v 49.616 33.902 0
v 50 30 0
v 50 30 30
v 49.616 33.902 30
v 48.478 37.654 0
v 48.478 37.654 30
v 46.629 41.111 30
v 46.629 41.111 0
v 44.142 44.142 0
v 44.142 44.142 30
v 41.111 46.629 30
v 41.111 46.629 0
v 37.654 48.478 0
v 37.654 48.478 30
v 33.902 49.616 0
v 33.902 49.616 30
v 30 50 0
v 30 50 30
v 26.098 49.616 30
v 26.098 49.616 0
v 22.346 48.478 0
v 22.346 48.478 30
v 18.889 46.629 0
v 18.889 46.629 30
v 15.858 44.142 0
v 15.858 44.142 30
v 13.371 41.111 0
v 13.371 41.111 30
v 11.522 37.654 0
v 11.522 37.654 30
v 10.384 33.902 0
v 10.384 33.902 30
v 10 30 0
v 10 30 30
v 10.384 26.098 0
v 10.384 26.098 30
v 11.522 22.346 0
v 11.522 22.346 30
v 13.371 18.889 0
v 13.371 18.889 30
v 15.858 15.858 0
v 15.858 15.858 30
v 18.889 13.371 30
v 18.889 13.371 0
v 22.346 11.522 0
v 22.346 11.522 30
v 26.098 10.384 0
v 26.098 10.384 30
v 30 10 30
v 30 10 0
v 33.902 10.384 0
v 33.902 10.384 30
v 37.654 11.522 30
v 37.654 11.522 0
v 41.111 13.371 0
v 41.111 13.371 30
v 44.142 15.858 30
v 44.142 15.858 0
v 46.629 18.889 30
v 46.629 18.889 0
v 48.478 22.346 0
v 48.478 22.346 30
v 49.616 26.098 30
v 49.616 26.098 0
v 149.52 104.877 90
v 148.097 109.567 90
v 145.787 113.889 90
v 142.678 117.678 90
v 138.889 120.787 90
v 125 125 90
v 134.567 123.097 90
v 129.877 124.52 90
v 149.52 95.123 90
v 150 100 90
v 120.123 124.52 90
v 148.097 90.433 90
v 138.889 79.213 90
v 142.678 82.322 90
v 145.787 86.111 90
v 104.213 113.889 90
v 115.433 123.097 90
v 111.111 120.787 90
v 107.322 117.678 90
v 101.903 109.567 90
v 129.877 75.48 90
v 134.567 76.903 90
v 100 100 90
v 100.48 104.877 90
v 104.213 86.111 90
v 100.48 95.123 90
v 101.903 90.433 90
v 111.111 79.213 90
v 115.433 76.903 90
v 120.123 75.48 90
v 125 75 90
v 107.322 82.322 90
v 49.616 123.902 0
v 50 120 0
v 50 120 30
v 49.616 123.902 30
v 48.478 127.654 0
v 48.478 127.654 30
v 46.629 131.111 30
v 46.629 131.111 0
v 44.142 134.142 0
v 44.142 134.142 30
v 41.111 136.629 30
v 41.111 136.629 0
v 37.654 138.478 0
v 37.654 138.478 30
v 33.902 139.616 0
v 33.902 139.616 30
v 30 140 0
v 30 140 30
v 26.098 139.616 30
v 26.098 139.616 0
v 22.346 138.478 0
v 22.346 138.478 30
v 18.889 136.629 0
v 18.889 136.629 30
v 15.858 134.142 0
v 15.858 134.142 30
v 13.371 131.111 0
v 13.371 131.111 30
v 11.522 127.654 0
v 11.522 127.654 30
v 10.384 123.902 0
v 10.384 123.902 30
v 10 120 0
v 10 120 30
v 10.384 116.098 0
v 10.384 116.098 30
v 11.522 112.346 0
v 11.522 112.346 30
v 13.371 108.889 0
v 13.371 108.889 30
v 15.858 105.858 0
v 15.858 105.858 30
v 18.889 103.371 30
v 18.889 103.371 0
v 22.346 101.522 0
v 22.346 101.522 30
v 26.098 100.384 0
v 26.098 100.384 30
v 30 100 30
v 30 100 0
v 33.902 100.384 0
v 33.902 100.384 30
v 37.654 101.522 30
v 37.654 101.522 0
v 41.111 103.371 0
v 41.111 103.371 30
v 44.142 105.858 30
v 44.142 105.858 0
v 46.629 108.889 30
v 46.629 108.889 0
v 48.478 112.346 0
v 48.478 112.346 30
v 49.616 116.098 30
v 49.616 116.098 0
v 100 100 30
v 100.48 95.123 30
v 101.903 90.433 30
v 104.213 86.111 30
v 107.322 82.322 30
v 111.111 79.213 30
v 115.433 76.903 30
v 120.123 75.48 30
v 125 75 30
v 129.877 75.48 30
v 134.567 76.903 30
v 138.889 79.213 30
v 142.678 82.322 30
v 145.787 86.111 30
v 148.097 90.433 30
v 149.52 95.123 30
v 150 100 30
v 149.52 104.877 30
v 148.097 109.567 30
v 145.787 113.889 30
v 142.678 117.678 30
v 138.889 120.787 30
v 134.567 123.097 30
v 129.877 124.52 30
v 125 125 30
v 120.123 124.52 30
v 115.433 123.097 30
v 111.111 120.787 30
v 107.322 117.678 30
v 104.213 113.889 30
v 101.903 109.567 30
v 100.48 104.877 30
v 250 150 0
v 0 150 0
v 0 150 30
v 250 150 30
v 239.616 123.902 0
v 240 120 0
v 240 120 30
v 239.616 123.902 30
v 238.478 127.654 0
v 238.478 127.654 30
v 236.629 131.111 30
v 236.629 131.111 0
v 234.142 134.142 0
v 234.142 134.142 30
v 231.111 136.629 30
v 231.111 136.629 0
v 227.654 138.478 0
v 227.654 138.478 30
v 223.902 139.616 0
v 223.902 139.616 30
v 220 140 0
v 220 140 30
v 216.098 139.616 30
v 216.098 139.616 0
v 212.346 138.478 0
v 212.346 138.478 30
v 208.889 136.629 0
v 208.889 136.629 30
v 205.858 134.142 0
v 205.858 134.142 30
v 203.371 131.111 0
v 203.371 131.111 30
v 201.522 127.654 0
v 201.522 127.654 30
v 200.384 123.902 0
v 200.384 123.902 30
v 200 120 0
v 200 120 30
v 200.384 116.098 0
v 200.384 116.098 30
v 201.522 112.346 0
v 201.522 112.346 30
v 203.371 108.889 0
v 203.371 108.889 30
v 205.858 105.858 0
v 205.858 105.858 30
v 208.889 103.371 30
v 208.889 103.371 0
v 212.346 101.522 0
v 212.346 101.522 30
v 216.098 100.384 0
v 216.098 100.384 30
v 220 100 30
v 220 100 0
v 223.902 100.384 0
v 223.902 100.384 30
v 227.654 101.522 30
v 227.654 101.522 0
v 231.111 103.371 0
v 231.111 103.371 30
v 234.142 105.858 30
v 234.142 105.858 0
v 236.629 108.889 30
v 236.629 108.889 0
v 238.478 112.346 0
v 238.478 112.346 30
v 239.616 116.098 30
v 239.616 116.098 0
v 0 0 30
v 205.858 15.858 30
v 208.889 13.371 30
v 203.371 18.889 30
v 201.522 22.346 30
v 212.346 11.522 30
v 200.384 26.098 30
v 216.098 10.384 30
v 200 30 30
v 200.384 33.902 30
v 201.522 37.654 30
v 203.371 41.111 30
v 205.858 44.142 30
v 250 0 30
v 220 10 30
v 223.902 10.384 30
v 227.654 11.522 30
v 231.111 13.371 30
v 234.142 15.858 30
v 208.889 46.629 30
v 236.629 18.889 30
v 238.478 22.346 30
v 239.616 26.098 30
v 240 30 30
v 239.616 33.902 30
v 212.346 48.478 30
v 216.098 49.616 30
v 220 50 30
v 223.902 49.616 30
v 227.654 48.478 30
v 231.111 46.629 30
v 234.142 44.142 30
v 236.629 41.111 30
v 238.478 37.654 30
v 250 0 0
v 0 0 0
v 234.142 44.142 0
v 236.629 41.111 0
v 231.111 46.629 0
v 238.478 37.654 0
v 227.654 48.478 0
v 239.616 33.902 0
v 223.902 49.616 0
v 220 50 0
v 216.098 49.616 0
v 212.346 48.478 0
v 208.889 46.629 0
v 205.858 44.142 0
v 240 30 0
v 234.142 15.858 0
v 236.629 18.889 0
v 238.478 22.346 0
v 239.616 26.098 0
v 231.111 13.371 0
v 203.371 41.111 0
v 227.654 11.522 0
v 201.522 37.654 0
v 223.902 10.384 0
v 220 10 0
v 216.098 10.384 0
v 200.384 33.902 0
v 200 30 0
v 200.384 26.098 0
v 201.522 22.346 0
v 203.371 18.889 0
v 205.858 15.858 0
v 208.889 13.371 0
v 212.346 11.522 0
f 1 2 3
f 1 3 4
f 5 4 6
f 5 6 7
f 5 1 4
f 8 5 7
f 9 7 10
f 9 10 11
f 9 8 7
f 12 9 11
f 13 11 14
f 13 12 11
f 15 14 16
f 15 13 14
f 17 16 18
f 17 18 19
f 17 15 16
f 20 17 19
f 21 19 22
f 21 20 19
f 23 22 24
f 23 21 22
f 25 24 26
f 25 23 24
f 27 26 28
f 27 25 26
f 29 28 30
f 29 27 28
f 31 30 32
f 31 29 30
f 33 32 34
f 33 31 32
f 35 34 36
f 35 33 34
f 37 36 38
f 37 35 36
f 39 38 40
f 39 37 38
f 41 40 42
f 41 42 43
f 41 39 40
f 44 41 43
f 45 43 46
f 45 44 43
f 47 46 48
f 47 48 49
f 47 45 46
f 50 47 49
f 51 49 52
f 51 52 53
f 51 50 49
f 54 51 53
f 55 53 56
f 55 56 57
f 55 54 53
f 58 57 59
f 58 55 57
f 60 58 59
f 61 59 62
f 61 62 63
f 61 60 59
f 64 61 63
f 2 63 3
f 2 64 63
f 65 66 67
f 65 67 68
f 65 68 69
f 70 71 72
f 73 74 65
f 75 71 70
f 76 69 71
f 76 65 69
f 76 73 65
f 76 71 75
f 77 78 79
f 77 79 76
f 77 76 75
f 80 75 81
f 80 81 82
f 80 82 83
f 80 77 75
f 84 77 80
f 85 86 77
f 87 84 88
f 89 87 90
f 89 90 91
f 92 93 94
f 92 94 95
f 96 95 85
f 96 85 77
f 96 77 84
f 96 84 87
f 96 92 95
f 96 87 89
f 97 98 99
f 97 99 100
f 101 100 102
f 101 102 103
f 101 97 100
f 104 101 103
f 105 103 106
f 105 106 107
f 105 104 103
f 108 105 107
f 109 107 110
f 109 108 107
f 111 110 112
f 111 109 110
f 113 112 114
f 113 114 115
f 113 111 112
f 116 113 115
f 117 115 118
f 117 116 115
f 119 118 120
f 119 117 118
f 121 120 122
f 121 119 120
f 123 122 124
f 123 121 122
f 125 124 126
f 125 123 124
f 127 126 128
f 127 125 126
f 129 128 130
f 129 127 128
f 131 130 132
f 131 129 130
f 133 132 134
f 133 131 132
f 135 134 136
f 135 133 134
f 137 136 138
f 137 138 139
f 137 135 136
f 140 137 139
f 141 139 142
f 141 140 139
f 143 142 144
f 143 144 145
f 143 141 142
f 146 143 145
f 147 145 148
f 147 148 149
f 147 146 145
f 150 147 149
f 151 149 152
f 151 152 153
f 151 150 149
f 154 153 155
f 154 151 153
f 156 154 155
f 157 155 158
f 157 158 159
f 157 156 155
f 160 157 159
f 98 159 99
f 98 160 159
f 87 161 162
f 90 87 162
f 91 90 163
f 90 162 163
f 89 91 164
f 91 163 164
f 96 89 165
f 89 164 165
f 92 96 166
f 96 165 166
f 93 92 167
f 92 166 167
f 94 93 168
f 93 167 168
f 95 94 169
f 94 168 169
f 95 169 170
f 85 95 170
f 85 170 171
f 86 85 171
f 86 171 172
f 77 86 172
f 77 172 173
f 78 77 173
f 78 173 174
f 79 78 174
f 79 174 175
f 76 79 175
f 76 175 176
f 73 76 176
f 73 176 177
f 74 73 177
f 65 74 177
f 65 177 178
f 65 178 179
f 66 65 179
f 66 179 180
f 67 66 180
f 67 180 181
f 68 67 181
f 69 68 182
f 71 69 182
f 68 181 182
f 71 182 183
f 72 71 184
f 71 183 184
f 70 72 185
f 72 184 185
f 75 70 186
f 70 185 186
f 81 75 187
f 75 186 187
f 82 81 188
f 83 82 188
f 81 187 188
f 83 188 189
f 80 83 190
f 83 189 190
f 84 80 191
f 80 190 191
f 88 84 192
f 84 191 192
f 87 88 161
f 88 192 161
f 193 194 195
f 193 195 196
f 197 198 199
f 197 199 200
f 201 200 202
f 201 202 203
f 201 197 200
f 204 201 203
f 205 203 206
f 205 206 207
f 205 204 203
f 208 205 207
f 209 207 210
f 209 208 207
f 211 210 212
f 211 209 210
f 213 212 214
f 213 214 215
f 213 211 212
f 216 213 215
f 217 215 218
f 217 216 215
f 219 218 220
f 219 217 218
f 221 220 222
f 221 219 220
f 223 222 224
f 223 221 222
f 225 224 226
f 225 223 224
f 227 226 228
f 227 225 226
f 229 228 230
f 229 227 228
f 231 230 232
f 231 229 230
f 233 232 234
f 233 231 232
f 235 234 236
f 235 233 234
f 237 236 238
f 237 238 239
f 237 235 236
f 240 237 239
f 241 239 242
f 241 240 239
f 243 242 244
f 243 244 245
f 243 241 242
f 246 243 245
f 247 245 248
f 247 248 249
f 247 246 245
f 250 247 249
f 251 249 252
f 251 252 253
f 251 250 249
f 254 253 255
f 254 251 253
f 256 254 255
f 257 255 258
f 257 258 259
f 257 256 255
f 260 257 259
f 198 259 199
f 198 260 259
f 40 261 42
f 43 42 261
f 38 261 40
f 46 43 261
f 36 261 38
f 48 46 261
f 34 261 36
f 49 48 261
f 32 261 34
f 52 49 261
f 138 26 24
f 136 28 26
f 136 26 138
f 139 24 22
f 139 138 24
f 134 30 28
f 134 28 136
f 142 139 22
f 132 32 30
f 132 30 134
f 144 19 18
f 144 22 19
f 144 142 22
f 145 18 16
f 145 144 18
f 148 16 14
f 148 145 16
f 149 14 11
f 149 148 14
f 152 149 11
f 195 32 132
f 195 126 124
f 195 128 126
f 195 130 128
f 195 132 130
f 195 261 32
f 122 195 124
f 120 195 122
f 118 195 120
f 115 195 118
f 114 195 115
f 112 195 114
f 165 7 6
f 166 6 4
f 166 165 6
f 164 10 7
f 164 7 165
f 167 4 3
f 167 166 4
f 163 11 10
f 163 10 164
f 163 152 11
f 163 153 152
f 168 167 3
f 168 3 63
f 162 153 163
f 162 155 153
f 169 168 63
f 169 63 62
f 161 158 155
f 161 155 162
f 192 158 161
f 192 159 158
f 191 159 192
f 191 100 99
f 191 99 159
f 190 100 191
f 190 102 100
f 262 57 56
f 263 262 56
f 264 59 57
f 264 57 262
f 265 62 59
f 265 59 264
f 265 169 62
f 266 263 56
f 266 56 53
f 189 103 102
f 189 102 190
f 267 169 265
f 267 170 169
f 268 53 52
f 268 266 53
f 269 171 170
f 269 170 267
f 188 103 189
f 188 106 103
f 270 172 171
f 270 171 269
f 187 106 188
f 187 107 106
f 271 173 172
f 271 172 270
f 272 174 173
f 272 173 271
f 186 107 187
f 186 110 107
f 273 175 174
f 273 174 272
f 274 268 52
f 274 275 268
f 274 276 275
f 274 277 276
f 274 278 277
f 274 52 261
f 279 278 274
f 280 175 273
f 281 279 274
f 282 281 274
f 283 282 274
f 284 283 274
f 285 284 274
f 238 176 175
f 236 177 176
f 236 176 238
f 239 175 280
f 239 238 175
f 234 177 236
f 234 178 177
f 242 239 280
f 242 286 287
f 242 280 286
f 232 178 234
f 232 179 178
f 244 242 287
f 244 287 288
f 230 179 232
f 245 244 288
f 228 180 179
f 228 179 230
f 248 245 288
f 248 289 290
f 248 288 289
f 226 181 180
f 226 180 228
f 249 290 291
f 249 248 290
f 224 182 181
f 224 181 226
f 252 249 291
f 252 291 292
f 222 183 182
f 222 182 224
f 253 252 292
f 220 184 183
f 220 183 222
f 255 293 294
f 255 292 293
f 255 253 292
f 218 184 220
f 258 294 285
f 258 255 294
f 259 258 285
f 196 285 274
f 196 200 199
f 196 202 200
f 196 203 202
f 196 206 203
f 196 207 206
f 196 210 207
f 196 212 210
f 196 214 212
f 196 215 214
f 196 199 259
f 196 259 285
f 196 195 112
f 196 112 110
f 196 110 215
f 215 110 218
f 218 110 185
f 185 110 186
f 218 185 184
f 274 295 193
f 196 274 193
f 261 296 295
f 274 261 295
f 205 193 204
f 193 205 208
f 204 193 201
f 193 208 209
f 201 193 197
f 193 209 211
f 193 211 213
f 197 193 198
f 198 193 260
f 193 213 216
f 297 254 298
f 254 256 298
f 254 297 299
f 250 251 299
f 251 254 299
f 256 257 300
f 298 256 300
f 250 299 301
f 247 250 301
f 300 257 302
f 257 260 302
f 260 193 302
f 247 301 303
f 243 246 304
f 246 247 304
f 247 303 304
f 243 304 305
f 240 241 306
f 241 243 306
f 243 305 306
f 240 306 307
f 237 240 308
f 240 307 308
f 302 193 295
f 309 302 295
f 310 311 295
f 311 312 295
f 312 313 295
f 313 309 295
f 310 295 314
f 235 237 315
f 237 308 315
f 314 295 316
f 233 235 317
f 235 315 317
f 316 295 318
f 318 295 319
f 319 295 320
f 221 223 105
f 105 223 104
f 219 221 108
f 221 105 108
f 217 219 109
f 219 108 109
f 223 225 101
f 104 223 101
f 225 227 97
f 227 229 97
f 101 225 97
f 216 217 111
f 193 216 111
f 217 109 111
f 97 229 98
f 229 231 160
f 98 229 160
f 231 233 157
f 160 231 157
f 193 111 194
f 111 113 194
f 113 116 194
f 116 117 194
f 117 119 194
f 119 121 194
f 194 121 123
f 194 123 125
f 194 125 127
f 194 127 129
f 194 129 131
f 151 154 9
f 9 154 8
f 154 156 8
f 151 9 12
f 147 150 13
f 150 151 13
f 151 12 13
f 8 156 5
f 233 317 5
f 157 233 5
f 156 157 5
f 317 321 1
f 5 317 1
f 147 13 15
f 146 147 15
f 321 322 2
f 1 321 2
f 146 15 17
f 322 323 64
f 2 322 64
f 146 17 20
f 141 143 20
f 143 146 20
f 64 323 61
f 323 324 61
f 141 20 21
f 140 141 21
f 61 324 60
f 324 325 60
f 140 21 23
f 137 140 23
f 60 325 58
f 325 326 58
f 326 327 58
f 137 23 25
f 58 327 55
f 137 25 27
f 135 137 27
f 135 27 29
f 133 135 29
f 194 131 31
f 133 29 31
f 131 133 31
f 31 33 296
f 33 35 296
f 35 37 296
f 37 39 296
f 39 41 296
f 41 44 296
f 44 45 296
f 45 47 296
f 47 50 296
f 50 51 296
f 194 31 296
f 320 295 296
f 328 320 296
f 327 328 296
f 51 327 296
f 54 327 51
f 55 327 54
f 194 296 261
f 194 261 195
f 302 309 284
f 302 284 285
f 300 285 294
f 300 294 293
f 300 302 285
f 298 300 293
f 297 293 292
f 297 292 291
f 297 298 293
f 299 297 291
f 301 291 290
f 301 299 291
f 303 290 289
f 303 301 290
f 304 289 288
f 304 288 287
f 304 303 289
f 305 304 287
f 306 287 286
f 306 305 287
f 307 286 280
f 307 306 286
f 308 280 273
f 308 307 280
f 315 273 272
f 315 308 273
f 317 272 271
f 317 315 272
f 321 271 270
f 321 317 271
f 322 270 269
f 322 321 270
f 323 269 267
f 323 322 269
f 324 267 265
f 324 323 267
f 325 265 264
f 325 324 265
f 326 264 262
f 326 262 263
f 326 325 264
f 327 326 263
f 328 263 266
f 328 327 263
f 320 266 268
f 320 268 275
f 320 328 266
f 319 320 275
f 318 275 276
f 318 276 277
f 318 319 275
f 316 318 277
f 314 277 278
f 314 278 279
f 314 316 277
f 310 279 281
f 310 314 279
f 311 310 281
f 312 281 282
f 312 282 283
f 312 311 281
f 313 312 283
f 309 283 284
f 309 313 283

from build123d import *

# Parameters (mm, degrees)
SKETCH1_W           = 250
SKETCH1_H           = 150
SKETCH1_R           = 20
BOSS_EXTRUDE1_DEPTH = 30
SKETCH2_R           = 25
BOSS_EXTRUDE3_DEPTH = 90


with BuildPart() as part:
    # Sketch1 → Boss-Extrude1 (new body)
    with BuildSketch(Plane.XY):
        with Locations((125, 75)):
            Rectangle(SKETCH1_W, SKETCH1_H)
        with Locations((30, 30)):
            Circle(SKETCH1_R, mode=Mode.SUBTRACT)
        with Locations((220, 30)):
            Circle(SKETCH1_R, mode=Mode.SUBTRACT)
        with Locations((220, 120)):
            Circle(SKETCH1_R, mode=Mode.SUBTRACT)
        with Locations((30, 120)):
            Circle(SKETCH1_R, mode=Mode.SUBTRACT)
    extrude(amount=BOSS_EXTRUDE1_DEPTH)

    # Sketch2 → Boss-Extrude3 (add)
    with BuildSketch(Plane.XY):
        with Locations(Location((125, 100, 0), (0, 0, 180))):
            Circle(SKETCH2_R)
    extrude(amount=BOSS_EXTRUDE3_DEPTH)


solid = part.part
